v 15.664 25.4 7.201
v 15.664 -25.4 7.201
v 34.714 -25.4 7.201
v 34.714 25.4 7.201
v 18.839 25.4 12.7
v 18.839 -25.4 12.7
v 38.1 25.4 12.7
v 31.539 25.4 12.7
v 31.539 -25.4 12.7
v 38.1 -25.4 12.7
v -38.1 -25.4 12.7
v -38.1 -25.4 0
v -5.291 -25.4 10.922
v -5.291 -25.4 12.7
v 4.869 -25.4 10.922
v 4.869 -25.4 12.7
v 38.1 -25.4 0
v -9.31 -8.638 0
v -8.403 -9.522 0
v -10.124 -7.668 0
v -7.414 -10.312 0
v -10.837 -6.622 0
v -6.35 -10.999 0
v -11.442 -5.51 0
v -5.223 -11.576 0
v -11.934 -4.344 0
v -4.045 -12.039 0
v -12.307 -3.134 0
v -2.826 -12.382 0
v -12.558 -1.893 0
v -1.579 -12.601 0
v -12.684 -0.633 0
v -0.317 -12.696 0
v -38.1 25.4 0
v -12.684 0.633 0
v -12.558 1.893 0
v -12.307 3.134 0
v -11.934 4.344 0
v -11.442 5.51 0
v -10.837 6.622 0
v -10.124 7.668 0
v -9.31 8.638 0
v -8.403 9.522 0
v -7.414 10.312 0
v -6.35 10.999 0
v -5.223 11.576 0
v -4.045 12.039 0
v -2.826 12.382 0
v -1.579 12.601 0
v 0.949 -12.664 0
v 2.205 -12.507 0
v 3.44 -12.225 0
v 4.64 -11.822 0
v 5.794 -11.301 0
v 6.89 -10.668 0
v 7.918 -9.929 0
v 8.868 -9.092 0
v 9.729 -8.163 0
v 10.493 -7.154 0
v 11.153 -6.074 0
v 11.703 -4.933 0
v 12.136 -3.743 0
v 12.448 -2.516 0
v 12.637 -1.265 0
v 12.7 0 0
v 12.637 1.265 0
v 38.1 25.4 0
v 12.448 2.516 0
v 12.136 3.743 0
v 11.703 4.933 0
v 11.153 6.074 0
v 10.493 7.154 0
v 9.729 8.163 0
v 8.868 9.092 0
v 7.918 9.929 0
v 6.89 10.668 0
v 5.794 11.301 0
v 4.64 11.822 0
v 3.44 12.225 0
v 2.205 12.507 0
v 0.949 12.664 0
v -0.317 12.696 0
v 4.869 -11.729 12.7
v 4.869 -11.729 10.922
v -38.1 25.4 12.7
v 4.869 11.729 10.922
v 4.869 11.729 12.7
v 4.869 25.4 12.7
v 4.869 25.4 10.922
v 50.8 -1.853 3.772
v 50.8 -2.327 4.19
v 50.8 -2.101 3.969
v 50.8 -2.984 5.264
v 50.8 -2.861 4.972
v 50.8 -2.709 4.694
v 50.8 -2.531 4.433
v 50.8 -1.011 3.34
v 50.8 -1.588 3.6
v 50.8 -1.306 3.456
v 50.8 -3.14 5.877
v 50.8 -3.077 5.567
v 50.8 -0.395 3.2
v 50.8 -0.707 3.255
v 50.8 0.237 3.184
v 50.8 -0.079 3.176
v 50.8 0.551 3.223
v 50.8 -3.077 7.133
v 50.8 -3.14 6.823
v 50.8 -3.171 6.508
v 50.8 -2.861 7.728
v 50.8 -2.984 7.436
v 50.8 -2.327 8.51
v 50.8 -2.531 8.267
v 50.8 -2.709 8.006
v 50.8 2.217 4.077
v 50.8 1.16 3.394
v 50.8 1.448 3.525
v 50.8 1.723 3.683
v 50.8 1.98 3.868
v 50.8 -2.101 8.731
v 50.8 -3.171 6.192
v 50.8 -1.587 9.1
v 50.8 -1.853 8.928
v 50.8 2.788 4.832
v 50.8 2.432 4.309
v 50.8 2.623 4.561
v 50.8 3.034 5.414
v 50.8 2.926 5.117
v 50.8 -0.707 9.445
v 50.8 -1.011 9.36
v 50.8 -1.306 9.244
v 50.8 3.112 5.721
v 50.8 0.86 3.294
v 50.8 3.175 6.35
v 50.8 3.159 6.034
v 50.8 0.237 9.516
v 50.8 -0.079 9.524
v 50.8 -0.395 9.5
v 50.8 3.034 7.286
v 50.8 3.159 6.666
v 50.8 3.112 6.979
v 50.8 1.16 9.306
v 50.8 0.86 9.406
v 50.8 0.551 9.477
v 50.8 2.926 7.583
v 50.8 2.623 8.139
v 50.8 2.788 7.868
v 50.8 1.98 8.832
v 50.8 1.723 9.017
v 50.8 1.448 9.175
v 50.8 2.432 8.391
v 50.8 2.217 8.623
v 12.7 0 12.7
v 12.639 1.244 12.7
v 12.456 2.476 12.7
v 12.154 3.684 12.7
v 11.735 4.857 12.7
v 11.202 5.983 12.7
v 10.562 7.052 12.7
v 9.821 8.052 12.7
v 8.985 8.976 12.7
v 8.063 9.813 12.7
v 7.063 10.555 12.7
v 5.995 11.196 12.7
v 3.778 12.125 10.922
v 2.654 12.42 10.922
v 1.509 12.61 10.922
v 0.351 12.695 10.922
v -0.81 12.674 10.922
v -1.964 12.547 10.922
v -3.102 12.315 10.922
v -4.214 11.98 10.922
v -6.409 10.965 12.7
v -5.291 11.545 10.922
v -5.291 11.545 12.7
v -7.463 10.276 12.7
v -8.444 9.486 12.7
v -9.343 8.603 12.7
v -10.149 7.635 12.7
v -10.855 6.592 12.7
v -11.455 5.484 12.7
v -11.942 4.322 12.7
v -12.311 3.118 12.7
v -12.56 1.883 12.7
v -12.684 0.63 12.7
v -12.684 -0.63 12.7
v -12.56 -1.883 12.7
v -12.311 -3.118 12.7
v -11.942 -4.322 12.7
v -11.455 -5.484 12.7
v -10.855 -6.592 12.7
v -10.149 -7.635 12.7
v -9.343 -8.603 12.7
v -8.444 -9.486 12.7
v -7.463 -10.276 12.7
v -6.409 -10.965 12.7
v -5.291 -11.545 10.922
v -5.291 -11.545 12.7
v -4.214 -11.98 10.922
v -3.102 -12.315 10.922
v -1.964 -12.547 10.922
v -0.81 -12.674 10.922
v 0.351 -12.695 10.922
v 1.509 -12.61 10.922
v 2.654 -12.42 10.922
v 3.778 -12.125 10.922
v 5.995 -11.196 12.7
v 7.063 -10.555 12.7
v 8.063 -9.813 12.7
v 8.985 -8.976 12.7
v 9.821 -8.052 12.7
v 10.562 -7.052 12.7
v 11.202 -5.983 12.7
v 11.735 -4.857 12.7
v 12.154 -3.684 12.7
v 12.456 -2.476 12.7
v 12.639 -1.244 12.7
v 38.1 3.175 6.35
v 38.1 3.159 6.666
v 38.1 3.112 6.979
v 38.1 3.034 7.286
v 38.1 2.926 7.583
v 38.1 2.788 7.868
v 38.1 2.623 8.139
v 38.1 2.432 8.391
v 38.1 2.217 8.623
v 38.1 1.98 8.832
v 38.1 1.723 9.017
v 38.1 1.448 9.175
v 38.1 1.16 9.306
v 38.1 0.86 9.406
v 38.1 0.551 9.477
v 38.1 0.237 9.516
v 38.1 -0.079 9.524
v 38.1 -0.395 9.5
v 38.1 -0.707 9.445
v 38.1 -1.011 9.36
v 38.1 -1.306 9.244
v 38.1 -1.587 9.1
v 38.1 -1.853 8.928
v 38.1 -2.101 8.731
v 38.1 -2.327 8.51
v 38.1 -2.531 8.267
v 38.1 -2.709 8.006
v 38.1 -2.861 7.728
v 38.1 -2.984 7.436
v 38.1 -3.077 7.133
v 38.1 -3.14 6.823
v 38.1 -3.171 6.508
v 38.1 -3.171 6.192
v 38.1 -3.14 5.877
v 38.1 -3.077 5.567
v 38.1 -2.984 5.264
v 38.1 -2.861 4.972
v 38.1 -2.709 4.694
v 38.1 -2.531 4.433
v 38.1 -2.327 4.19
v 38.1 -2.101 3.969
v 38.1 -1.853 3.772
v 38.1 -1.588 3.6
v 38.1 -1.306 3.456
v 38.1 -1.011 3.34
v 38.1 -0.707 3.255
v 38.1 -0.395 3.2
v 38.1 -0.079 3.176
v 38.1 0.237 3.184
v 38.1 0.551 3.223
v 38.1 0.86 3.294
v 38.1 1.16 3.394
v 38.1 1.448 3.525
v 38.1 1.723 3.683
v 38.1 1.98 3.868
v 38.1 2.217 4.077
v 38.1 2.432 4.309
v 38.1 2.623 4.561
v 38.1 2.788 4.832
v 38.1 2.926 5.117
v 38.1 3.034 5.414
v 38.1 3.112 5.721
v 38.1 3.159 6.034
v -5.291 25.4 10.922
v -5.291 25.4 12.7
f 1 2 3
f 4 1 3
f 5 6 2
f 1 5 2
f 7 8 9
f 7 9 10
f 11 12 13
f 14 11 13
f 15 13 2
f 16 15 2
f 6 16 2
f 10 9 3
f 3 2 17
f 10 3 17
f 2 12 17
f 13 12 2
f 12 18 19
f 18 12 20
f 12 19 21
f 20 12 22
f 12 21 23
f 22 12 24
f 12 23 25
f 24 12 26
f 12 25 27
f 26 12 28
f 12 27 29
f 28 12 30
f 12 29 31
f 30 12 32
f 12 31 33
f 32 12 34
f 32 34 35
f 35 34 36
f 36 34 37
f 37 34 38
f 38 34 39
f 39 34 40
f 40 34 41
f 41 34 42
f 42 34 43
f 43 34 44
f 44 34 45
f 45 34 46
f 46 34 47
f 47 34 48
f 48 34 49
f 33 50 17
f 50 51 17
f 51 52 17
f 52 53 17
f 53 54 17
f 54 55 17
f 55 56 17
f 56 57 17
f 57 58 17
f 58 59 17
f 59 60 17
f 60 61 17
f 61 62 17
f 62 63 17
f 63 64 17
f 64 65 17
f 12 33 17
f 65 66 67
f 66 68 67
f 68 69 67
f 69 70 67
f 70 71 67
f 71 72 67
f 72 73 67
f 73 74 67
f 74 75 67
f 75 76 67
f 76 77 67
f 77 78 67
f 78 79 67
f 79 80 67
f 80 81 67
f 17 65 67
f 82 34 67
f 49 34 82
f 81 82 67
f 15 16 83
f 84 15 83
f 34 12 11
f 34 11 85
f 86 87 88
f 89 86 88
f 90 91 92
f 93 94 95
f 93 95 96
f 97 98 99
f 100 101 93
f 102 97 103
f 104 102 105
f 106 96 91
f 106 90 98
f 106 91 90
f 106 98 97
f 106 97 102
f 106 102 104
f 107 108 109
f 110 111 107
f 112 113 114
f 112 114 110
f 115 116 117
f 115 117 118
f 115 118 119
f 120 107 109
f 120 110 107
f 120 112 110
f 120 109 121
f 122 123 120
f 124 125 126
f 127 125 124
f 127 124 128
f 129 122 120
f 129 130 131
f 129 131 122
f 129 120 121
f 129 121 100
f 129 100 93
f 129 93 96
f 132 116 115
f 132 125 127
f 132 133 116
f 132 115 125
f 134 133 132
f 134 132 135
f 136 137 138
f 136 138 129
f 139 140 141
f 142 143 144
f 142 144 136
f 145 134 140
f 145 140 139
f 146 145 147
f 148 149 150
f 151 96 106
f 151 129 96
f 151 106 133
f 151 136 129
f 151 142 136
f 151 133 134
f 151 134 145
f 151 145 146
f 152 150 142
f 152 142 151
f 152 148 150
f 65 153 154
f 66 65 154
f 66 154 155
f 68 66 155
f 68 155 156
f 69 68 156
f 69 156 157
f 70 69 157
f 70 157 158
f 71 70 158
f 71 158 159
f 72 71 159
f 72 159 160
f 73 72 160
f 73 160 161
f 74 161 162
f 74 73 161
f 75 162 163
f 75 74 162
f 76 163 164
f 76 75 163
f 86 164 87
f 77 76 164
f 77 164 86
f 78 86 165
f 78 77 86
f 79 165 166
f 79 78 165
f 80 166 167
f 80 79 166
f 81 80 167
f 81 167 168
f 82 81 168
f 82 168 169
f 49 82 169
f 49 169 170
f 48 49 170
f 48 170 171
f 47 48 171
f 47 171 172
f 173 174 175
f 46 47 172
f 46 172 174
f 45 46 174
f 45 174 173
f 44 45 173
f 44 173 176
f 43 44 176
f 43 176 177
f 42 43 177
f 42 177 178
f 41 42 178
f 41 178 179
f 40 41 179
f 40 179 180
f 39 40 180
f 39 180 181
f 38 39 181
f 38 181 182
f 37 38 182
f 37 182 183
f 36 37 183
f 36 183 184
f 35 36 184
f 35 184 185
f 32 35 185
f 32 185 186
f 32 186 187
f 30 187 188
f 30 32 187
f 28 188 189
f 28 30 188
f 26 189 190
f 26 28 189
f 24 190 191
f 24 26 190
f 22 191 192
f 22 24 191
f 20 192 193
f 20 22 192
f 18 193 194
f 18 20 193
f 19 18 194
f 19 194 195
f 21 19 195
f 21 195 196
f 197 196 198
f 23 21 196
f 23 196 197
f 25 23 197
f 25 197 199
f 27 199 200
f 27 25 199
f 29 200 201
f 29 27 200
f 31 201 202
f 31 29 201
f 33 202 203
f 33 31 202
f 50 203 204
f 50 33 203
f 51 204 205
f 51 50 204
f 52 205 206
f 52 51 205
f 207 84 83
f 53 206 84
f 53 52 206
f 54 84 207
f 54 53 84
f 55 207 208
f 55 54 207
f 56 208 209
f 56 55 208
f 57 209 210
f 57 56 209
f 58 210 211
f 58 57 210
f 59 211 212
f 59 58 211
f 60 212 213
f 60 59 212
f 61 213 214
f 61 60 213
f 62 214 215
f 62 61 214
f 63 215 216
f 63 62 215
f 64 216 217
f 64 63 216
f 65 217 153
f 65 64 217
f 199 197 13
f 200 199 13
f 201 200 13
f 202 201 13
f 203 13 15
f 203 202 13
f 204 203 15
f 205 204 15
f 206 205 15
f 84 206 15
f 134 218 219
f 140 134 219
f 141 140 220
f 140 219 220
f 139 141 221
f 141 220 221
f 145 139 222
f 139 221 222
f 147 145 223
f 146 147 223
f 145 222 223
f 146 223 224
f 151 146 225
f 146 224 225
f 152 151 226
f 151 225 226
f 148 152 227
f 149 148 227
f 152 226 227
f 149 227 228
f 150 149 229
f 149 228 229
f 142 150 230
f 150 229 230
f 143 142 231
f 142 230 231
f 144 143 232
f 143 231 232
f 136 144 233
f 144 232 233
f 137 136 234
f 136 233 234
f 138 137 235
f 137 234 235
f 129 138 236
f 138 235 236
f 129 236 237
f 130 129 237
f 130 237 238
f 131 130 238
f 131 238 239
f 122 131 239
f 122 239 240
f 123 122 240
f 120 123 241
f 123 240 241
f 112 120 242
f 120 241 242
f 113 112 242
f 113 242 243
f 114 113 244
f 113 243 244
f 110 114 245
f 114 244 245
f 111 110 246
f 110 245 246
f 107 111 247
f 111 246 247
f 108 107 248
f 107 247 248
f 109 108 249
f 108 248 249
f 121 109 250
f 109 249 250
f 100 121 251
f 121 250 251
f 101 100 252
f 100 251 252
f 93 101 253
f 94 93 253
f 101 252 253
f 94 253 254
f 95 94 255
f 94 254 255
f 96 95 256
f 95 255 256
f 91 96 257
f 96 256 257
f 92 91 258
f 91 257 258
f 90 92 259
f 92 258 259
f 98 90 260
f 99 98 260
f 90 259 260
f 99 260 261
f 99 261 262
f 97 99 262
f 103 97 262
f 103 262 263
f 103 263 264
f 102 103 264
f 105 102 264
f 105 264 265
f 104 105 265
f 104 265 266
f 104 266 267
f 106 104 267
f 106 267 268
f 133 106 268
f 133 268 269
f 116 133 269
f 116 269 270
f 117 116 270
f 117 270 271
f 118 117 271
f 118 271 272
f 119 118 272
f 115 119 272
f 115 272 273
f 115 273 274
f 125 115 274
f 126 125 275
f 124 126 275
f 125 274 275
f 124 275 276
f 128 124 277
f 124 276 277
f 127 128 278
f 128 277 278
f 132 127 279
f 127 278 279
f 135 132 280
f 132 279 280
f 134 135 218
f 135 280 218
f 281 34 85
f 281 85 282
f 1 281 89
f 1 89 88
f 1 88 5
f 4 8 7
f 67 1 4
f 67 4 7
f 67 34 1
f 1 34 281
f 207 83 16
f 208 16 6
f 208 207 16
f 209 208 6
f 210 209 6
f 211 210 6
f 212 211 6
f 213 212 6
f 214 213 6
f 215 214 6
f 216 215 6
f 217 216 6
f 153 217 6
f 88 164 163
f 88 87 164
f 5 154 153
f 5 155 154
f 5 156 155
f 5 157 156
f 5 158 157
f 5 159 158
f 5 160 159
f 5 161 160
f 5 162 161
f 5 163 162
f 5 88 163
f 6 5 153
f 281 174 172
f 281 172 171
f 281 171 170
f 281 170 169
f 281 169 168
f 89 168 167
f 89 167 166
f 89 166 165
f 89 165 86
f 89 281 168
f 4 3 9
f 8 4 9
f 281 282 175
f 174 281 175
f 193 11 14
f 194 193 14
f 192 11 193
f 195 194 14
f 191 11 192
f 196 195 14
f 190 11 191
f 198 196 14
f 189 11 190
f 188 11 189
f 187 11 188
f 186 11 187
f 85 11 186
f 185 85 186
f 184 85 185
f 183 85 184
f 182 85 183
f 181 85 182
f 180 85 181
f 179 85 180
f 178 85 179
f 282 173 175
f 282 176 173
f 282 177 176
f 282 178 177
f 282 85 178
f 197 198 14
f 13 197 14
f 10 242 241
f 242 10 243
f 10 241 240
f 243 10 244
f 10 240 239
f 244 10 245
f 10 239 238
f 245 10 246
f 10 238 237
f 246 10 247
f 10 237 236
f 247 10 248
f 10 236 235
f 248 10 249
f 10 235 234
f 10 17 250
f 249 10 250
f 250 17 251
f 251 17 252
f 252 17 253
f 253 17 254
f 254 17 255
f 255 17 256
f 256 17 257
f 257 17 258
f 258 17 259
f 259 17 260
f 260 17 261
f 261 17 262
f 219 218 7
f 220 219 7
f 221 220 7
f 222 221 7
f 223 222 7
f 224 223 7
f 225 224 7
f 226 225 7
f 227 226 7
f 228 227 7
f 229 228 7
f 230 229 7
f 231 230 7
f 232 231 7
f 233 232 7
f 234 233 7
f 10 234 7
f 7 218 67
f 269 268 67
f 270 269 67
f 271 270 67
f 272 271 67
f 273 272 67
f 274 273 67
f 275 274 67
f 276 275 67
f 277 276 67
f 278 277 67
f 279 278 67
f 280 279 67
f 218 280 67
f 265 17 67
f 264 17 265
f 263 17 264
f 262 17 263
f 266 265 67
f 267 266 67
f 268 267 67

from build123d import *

# Parameters (mm, degrees)
F0_W     = 76.2
F0_H     = 50.8
F0_R     = 12.7
F1_DEPTH = 12.7
F3_DEPTH = 1.778
F5_DEPTH = 50.8
F6_R     = 3.175
F7_DEPTH = 12.7


with BuildPart() as f1:
    # F0 (on Top) → F1 (new body)
    with BuildSketch(Plane.XY):
        Rectangle(F0_W, F0_H)
        Circle(F0_R, mode=Mode.SUBTRACT)
    extrude(amount=F1_DEPTH)

    # F2 (on face) → F3 (cut)
    with BuildSketch(Plane.XY.offset(12.7)):
        with BuildLine():
            Line((4.8691992944, 25.4), (-5.2908007056, 25.4))
            Line((-5.2908007056, 25.4), (-5.2908007056, 11.545450528))
            ThreePointArc((-5.2908007056, 11.545450528), (-0.2300096138, 12.6979169779), (4.8691992944, 11.7294884045))
            Line((4.8691992944, 11.7294884045), (4.8691992944, 25.4))
        make_face()
        with BuildLine():
            Line((-5.2908007056, -11.545450528), (-5.2908007056, -25.4))
            Line((-5.2908007056, -25.4), (4.8691992944, -25.4))
            Line((4.8691992944, -25.4), (4.8691992944, -11.7294884045))
            ThreePointArc((4.8691992944, -11.7294884045), (-0.2300096138, -12.6979169779), (-5.2908007056, -11.545450528))
        make_face()
        with BuildLine():
            Line((-5.2908007056, 11.545450528), (-5.2908007056, -11.545450528))
            ThreePointArc((-5.2908007056, -11.545450528), (-0.2300096138, -12.6979169779), (4.8691992944, -11.7294884045))
            Line((4.8691992944, -11.7294884045), (4.8691992944, 11.7294884045))
            ThreePointArc((4.8691992944, 11.7294884045), (-0.2300096138, 12.6979169779), (-5.2908007056, 11.545450528))
        make_face()
    extrude(amount=-F3_DEPTH, mode=Mode.SUBTRACT)

    # F4 (on face) → F5 (cut, through all)
    with BuildSketch(Plane.XZ.offset(25.4)):
        Polygon((31.5391992944, 12.7), (18.8391992944, 12.7), (15.6641992944, 7.200738686), (34.7141992944, 7.200738686), align=None)
    extrude(amount=-F5_DEPTH, mode=Mode.SUBTRACT)

    # F6 (on face) → F7 (join)
    with BuildSketch(Plane.YZ.offset(38.1)):
        with Locations((0, 6.35)):
            Circle(F6_R)
    extrude(amount=F7_DEPTH)


solid = f1.part
